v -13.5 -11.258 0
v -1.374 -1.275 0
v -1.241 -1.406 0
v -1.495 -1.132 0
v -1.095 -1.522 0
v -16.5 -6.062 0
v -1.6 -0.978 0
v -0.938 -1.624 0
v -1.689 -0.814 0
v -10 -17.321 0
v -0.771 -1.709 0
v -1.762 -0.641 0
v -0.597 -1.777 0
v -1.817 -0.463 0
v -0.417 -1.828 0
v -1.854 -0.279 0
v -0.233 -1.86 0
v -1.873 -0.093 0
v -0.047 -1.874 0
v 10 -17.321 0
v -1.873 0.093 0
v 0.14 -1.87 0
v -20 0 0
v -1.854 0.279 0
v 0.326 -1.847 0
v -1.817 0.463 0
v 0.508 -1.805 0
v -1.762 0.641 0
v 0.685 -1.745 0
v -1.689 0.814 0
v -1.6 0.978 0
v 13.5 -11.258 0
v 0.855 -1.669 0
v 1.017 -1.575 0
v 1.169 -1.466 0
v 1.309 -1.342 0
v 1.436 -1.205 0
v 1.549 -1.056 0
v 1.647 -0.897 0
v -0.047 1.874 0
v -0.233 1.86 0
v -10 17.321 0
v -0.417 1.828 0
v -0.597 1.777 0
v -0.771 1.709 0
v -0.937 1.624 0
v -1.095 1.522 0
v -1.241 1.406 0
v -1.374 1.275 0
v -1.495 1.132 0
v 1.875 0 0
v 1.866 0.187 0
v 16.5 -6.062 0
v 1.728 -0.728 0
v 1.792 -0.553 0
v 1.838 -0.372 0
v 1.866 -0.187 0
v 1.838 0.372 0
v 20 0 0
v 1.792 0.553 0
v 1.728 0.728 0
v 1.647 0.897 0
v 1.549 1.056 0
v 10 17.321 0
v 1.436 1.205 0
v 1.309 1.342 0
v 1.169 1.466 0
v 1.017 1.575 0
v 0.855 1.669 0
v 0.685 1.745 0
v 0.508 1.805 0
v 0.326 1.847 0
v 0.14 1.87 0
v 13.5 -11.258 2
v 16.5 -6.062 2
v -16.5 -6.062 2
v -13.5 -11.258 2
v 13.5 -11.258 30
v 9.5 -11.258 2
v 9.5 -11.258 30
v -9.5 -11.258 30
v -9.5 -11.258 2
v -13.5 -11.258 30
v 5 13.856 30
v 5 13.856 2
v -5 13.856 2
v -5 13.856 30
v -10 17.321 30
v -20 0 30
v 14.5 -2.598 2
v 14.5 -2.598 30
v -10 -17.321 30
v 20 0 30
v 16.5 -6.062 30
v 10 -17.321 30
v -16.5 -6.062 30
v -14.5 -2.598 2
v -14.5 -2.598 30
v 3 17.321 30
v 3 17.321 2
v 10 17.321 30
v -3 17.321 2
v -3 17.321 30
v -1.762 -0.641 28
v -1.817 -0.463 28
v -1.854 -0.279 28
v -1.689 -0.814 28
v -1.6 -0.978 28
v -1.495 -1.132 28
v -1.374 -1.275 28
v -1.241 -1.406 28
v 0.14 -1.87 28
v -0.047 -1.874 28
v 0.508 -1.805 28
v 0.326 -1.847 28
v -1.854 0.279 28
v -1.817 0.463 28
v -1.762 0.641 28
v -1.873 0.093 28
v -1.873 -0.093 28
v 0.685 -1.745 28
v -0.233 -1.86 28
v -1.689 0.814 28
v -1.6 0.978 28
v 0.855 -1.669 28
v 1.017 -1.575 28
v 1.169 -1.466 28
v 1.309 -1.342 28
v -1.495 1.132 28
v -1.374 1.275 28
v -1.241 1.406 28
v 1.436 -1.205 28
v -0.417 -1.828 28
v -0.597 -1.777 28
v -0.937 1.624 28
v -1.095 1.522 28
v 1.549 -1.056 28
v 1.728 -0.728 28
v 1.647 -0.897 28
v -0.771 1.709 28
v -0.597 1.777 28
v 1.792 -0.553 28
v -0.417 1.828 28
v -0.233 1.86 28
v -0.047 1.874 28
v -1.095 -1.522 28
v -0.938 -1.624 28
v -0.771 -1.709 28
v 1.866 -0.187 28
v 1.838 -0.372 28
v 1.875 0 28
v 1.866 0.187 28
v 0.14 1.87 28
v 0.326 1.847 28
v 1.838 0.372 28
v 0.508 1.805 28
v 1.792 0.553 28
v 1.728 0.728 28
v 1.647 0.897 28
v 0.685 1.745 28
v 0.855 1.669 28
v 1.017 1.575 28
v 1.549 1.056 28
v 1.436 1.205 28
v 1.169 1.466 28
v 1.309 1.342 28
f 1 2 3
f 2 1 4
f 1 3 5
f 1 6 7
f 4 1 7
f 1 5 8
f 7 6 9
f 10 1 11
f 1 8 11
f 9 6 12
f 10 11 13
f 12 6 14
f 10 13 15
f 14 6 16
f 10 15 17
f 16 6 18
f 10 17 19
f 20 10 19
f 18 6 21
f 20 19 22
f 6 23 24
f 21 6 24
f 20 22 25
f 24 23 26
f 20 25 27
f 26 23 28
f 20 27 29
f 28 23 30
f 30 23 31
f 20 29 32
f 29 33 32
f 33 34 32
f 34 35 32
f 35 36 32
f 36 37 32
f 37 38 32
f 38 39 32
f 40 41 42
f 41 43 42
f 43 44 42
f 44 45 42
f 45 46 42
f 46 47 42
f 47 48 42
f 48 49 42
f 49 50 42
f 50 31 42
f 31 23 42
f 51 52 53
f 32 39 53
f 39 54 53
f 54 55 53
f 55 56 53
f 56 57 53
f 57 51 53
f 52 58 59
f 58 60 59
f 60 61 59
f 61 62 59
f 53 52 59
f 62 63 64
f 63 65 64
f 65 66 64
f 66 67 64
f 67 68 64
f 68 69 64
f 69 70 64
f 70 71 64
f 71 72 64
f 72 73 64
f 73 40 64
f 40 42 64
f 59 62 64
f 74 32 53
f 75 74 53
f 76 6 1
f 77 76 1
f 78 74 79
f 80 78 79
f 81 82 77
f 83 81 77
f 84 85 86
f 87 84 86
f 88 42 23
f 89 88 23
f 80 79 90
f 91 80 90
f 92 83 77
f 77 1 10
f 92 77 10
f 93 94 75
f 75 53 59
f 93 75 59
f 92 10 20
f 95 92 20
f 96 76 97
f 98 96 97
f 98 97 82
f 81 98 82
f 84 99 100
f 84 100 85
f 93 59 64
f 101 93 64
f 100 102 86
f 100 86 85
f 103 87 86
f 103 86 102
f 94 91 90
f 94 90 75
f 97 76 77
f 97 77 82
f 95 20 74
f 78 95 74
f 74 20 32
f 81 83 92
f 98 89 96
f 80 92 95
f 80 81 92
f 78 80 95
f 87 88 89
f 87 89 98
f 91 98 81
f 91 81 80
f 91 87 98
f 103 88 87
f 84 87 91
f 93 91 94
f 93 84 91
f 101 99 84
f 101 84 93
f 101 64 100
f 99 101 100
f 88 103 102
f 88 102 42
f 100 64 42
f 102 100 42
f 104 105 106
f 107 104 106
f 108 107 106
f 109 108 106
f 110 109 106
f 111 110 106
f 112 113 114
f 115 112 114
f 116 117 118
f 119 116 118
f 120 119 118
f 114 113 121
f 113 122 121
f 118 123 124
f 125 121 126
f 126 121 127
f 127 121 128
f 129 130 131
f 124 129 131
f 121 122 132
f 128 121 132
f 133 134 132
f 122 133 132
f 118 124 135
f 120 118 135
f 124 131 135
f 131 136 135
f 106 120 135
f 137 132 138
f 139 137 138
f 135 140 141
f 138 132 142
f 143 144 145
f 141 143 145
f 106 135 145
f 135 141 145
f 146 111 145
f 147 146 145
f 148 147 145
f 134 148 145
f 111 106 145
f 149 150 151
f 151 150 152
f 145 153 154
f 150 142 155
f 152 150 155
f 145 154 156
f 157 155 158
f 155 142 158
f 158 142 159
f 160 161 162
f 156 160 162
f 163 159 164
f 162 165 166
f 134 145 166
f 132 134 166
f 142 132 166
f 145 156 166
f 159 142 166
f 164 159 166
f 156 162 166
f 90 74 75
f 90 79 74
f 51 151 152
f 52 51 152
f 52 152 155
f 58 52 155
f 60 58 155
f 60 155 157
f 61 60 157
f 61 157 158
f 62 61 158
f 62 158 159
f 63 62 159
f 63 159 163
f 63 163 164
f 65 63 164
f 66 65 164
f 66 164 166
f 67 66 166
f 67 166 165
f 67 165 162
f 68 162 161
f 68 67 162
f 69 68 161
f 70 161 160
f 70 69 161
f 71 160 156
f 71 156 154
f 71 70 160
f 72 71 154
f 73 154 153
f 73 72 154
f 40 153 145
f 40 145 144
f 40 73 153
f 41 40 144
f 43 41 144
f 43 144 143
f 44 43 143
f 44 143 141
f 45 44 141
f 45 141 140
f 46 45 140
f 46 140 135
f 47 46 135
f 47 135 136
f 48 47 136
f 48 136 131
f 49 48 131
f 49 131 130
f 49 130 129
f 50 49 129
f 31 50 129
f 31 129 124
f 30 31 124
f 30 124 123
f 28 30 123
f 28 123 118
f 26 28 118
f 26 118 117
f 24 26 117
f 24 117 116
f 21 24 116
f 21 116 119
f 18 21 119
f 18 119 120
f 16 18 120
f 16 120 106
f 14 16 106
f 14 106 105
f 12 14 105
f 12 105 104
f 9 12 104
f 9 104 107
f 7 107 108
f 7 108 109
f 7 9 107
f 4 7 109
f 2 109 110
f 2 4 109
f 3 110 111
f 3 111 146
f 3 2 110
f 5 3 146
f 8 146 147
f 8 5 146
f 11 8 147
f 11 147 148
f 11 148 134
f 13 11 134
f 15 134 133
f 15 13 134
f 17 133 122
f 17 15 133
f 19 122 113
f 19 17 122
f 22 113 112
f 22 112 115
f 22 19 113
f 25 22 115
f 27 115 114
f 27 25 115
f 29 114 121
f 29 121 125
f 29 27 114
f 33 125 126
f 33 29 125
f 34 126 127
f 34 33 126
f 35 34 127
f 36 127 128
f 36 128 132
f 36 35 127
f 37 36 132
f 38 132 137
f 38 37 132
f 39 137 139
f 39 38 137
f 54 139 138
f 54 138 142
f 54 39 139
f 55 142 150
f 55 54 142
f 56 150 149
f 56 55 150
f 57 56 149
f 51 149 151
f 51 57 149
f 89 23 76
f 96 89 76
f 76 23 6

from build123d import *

# Parameters (mm, degrees)
F0_R     = 1.875
F1_DEPTH = 30
F2_DEPTH = 2
F3_START = 28
F3_DEPTH = 2


with BuildPart() as f1:
    # F0 (on Top) → F1 (new body)
    with BuildSketch(Plane.XY):
        Polygon((16.5, -6.0621778265), (20, 0), (10, 17.3205080757), (3, 17.3205080757), (5, 13.8564064606), (-5, 13.8564064606), (-3, 17.3205080757), (-10, 17.3205080757), (-20, 0), (-16.5, -6.0621778265), (-14.5, -2.5980762114), (-9.5, -11.2583302492), (-13.5, -11.2583302492), (-10, -17.3205080757), (10, -17.3205080757), (13.5, -11.2583302492), (9.5, -11.2583302492), (14.5, -2.5980762114), align=None)
        Circle(F0_R, mode=Mode.SUBTRACT)
    extrude(amount=F1_DEPTH)

    # F0 (on Top) → F2 (join)
    with BuildSketch(Plane.XY):
        Polygon((13.5, -11.2583302492), (16.5, -6.0621778265), (14.5, -2.5980762114), (9.5, -11.2583302492), align=None)
        Polygon((-16.5, -6.0621778265), (-13.5, -11.2583302492), (-9.5, -11.2583302492), (-14.5, -2.5980762114), align=None)
        Polygon((5, 13.8564064606), (3, 17.3205080757), (-3, 17.3205080757), (-5, 13.8564064606), align=None)
    extrude(amount=F2_DEPTH)

    # F0 (on Top) → F3 (join)
    with BuildSketch(Plane.XY.offset(F3_START)):
        Circle(F0_R)
    extrude(amount=F3_DEPTH)


solid = f1.part
